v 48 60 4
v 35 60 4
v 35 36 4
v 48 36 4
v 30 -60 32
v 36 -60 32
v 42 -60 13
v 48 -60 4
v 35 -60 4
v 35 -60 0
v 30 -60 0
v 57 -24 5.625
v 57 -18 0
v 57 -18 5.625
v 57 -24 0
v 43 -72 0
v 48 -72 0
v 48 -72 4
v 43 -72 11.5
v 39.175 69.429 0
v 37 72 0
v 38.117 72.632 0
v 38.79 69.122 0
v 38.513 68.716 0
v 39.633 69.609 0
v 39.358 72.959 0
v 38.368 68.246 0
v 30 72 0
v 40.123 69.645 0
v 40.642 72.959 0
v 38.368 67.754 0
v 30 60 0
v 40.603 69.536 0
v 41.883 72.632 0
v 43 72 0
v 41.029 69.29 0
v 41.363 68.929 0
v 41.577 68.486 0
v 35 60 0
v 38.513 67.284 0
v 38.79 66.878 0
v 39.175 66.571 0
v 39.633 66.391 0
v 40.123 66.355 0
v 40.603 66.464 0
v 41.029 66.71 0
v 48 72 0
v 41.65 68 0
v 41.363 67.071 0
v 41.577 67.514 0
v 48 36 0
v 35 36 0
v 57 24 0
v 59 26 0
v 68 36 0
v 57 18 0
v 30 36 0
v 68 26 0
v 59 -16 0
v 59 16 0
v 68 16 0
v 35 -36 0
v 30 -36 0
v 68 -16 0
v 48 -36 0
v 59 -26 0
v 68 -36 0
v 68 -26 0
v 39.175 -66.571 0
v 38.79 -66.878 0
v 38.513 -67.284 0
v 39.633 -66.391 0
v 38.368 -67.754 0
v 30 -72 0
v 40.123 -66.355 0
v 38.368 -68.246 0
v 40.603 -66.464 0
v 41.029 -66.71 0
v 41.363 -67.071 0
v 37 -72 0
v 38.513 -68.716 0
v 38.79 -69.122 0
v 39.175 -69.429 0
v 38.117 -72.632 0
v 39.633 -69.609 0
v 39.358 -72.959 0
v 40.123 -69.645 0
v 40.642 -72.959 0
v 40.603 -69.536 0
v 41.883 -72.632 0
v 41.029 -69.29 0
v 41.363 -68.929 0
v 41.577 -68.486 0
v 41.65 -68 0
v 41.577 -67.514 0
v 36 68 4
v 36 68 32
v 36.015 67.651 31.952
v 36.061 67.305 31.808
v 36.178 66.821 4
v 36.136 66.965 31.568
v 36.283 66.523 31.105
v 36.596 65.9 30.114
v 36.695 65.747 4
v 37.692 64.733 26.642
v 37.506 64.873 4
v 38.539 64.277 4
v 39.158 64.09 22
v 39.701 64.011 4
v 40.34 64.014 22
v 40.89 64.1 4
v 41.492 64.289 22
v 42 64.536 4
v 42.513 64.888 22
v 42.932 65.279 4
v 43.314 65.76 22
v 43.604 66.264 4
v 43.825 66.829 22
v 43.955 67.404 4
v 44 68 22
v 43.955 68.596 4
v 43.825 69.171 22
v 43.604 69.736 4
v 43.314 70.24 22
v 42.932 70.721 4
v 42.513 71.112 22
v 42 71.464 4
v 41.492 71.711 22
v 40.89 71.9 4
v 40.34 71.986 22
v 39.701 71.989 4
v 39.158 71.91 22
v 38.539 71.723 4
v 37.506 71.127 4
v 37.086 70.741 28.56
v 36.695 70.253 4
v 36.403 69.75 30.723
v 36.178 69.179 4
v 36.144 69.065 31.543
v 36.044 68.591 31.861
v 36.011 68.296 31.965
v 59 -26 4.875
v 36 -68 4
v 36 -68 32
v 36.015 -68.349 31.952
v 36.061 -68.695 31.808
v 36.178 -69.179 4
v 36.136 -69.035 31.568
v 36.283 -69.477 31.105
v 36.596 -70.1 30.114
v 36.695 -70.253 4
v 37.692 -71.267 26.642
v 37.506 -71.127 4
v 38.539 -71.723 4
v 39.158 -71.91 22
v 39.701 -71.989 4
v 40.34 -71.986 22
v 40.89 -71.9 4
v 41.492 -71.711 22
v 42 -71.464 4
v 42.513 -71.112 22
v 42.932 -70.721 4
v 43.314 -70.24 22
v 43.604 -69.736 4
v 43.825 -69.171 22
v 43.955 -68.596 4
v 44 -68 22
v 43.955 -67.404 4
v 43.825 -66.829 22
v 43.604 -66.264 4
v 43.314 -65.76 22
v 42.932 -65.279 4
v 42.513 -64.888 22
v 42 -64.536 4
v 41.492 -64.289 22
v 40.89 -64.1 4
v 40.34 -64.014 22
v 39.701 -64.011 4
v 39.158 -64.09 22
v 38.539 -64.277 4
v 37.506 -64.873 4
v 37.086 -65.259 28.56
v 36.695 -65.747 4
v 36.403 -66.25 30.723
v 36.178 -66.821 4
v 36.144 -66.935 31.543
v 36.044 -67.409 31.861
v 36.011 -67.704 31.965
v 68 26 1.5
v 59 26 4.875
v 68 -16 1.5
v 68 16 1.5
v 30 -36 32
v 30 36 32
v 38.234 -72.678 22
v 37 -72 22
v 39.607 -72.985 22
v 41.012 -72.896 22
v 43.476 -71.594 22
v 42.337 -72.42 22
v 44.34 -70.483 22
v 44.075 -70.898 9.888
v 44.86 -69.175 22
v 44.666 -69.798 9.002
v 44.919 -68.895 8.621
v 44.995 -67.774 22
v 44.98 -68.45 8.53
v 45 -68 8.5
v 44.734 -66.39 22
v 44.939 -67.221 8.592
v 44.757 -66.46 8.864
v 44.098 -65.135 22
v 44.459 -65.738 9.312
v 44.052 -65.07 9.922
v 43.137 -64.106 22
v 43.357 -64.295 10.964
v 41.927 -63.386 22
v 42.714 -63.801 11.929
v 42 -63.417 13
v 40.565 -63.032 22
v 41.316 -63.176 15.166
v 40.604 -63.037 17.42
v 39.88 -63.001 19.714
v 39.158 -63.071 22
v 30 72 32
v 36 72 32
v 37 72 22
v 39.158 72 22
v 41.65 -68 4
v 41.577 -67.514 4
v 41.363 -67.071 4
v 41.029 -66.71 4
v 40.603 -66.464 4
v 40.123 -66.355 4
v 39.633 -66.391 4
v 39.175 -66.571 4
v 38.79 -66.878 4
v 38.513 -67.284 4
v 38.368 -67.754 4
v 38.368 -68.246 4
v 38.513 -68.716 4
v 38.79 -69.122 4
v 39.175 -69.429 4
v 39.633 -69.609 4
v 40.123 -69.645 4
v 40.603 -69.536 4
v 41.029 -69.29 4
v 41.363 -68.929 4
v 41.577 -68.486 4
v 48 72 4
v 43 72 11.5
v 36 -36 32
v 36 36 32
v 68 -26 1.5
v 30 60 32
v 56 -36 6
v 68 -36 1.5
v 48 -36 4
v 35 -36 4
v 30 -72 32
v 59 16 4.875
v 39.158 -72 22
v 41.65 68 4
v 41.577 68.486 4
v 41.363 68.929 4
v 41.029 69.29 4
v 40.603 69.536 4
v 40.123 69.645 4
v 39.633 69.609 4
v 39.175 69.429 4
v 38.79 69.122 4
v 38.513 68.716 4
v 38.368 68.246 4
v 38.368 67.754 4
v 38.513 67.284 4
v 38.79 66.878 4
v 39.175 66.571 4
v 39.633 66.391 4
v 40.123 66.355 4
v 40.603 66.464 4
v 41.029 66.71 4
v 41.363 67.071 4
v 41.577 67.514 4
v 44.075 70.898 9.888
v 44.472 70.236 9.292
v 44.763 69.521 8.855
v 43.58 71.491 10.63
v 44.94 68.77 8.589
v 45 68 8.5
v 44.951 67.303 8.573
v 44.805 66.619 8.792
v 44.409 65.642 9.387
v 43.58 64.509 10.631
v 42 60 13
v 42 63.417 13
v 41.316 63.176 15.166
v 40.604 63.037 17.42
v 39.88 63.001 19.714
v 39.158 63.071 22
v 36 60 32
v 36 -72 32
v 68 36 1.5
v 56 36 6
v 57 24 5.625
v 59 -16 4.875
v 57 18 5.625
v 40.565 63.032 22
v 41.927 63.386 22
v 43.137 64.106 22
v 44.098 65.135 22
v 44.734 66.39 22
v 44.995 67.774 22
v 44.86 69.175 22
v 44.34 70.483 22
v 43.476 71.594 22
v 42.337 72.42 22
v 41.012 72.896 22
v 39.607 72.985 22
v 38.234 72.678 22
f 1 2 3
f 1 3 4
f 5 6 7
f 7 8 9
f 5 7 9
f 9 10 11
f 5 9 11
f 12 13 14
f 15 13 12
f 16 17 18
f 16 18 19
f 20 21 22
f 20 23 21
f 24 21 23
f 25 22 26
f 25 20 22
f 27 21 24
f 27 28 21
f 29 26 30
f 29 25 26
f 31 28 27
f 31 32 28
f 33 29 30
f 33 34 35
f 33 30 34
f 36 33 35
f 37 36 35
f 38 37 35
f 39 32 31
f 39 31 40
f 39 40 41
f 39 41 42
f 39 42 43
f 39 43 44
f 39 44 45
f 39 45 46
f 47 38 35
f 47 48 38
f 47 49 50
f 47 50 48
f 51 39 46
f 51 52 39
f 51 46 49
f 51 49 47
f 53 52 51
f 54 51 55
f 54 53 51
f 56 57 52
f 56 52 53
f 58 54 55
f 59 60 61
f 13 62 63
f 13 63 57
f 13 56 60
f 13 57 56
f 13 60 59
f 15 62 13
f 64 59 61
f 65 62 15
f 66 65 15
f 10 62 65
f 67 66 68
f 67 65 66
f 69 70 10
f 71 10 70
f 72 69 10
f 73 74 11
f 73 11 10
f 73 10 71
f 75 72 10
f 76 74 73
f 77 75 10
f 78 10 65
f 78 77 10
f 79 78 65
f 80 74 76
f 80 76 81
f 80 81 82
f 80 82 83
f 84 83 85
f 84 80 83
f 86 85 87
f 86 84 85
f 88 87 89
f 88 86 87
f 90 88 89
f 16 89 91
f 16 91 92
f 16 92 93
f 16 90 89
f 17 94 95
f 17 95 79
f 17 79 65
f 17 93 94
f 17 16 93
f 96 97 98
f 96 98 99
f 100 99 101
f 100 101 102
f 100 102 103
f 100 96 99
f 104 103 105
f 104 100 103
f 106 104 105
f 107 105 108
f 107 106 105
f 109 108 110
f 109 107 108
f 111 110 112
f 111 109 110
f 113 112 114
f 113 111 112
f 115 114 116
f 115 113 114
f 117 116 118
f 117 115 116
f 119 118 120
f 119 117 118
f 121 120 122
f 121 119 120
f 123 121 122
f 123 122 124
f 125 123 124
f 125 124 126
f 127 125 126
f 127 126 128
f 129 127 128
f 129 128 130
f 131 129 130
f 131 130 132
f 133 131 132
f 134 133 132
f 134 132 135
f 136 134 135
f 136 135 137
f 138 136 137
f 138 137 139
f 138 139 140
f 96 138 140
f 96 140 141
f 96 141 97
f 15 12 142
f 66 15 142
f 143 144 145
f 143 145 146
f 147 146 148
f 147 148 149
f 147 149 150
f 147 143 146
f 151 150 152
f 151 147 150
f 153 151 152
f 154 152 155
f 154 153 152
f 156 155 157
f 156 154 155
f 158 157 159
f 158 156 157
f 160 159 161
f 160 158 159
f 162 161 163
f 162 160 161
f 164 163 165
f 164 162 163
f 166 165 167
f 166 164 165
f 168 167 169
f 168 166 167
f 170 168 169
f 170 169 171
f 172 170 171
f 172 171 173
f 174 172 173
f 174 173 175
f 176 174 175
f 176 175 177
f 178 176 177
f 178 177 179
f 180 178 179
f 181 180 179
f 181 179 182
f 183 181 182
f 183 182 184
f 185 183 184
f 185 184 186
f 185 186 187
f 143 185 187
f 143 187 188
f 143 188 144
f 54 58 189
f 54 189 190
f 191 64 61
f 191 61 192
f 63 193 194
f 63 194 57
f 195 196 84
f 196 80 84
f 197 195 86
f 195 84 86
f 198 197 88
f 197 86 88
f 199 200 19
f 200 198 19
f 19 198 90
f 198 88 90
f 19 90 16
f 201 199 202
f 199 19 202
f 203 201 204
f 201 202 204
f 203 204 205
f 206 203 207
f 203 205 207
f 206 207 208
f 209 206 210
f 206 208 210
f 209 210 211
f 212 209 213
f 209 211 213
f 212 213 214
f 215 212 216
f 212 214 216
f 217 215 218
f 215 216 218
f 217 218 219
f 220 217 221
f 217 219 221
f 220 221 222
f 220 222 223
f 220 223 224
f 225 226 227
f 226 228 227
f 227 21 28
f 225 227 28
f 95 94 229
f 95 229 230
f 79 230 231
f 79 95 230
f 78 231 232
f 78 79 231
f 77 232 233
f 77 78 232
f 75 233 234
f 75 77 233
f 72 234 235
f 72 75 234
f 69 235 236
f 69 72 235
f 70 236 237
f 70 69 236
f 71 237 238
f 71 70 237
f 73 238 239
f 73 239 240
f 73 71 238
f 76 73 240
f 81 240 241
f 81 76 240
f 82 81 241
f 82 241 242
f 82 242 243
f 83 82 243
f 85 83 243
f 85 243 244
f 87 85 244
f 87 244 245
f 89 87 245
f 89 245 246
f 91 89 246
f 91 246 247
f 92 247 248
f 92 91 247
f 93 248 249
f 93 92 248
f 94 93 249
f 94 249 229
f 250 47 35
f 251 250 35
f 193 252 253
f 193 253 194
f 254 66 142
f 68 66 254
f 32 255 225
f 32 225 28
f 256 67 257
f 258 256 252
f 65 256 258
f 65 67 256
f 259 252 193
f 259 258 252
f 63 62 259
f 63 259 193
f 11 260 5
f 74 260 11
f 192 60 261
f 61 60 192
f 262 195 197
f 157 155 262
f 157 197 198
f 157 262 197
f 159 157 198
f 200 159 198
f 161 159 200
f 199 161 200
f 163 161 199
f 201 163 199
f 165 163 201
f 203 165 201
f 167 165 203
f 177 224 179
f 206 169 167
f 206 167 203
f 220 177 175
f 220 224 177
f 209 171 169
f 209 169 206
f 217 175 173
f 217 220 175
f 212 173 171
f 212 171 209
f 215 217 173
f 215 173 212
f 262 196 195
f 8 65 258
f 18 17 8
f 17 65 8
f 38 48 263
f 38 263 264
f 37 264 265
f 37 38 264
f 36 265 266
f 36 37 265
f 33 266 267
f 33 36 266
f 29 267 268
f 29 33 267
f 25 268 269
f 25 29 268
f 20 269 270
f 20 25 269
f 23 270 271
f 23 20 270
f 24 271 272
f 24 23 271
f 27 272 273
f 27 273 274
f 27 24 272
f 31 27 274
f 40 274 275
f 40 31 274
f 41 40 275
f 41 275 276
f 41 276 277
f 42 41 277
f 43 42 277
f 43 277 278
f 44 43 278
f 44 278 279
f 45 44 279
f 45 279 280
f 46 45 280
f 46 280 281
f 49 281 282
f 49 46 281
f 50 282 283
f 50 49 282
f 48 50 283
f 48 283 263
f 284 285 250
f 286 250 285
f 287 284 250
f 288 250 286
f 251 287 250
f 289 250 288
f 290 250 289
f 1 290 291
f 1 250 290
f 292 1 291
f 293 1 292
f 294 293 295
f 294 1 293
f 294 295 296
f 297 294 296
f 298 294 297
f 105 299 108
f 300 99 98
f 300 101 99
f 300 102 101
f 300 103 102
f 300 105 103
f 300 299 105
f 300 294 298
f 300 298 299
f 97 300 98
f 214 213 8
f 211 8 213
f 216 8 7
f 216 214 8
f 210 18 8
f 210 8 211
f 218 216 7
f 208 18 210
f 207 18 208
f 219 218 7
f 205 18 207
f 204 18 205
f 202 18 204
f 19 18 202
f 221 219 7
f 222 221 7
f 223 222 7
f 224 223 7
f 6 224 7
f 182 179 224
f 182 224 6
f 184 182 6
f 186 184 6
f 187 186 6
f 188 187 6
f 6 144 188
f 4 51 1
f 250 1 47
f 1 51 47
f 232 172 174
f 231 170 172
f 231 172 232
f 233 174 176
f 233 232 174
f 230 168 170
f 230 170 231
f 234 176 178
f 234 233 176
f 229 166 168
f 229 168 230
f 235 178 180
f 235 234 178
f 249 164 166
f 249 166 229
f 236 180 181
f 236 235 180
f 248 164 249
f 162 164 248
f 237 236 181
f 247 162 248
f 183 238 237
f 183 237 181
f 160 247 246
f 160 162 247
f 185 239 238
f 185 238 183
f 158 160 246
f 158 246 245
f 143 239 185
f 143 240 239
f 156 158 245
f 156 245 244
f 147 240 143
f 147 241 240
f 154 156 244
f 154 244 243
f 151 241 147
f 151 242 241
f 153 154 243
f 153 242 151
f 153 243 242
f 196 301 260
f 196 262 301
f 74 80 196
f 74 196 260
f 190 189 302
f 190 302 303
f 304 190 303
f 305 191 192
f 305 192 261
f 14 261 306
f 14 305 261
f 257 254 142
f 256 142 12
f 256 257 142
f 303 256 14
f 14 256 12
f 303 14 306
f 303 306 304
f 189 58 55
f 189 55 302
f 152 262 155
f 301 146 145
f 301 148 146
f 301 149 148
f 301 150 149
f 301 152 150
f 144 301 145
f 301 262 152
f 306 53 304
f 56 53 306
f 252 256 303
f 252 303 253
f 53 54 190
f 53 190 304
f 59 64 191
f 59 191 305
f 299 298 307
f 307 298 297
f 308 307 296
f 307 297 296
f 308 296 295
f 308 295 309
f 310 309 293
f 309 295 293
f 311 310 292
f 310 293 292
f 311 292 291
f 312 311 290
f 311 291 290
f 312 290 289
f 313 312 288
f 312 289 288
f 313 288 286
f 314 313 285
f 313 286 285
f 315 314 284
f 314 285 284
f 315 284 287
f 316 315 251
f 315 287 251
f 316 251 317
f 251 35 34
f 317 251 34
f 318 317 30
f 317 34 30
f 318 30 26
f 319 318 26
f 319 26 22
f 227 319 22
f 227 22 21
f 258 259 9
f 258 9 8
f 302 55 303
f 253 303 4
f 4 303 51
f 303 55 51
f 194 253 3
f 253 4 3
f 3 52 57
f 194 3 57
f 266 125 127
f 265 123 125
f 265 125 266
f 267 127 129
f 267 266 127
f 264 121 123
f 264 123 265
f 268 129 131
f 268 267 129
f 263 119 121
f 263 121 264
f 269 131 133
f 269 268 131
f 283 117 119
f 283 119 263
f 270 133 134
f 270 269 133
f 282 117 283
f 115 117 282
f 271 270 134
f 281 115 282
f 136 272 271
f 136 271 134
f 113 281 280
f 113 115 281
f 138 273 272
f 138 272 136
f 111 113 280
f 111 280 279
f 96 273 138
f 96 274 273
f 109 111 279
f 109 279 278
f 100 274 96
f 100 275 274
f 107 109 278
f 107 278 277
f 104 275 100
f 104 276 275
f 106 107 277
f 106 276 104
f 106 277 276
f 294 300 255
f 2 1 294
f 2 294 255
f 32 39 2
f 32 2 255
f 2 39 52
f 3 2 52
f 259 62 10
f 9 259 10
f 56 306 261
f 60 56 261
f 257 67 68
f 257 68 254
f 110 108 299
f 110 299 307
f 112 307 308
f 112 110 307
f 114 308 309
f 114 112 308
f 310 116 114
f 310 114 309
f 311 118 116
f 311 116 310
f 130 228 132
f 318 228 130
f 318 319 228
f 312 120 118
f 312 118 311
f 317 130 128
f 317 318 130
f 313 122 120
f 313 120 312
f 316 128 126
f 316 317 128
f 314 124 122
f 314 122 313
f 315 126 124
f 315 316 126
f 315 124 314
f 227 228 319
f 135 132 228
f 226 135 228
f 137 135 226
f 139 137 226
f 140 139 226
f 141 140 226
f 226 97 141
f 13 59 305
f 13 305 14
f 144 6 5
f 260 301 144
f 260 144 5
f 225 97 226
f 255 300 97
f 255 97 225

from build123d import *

# Parameters (mm, degrees)
F_4MM_DEPTH             = 4
F_6MM_0_START           = -36
F_6MM_0_DEPTH           = 72
F_6MM_66_START          = 60
F_6MM_66_DEPTH          = 12
F_6MM_66_START_2        = -72
F_6MM_66_2_DEPTH        = 12
SKETCH_5_R              = 1.65
CUT_EXTRUDE_M3_DEPTH    = 4
SKETCH_7_R              = 5
SKETCH_7_R_2            = 1.65
EXTRUDE_D10_DEPTH       = 22
D8_4MM_START            = 4
SKETCH_8_R              = 4
D8_4MM_DEPTH            = 32
CUT_EXTRUDE_14X10_DEPTH = 40


with BuildPart() as part:
    # 草图1 → 加厚侧鞍底梁_4mm (new body)
    with BuildSketch(Plane.XY):
        Polygon((37, -72), (46, -72), (48, -70), (48, 70), (46, 72), (37, 72), (35, 70), (35, -70), align=None)
    extrude(amount=F_4MM_DEPTH)

    # 草图2 → 高侧壁6mm_分段缓降斜面_0 (add)
    with BuildSketch(Plane(origin=(0, 0, 0), x_dir=(1, 0, 0), z_dir=(0, 1, 0)).offset(F_6MM_0_START)):
        Polygon((30, 0), (68, 0), (68, -1.5), (56, -6), (36, -32), (30, -32), align=None)
    extrude(amount=F_6MM_0_DEPTH)

    # 草图3 → 6mm___66 (add)
    with BuildSketch(Plane(origin=(0, 0, 0), x_dir=(1, 0, 0), z_dir=(0, 1, 0)).offset(F_6MM_66_START)):
        Polygon((30, 0), (48, 0), (48, -4), (42, -13), (36, -32), (30, -32), align=None)
    extrude(amount=F_6MM_66_DEPTH)

    # 草图4 → 6mm___-66 2 (add)
    with BuildSketch(Plane(origin=(0, 0, 0), x_dir=(1, 0, 0), z_dir=(0, 1, 0)).offset(F_6MM_66_START_2)):
        Polygon((30, 0), (48, 0), (48, -4), (42, -13), (36, -32), (30, -32), align=None)
    extrude(amount=F_6MM_66_2_DEPTH)

    # 草图5 → 侧鞍M3贯穿固定孔 (cut)
    with BuildSketch(Plane.XY):
        with Locations((40, -68)):
            Circle(SKETCH_5_R)
        with Locations((40, 68)):
            Circle(SKETCH_5_R)
    extrude(amount=CUT_EXTRUDE_M3_DEPTH, mode=Mode.SUBTRACT)

    # 草图7 → 螺丝沉台局部加强圈_D10 (add)
    # profile 1 of 2: a face of its own
    with BuildSketch(Plane.XY):
        with Locations((40, -68)):
            Circle(SKETCH_7_R)
        with Locations((40, -68)):
            Circle(SKETCH_7_R_2, mode=Mode.SUBTRACT)
    # profile 2 of 2: a face of its own
    with BuildSketch(Plane.XY):
        with Locations((40, 68)):
            Circle(SKETCH_7_R)
        with Locations((40, 68)):
            Circle(SKETCH_7_R_2, mode=Mode.SUBTRACT)
    extrude(amount=EXTRUDE_D10_DEPTH)

    # 草图8 → 螺丝头及工具沉台_D8_保留4mm底 (cut)
    with BuildSketch(Plane.XY.offset(D8_4MM_START)):
        with Locations(Location((40, -68, 0), (0, 0, 180))):
            Circle(SKETCH_8_R)
        with Locations(Location((40, 68, 0), (0, 0, 180))):
            Circle(SKETCH_8_R)
    extrude(amount=D8_4MM_DEPTH, mode=Mode.SUBTRACT)

    # 草图9 → 板内钢索孔侧向敞口避让_14x10 (cut)
    with BuildSketch(Plane.XY):
        Polygon((59, 16), (69, 16), (71, 18), (71, 24), (69, 26), (59, 26), (57, 24), (57, 18), align=None)
        Polygon((59, -26), (69, -26), (71, -24), (71, -18), (69, -16), (59, -16), (57, -18), (57, -24), align=None)
    extrude(amount=CUT_EXTRUDE_14X10_DEPTH, mode=Mode.SUBTRACT)


solid = part.part
